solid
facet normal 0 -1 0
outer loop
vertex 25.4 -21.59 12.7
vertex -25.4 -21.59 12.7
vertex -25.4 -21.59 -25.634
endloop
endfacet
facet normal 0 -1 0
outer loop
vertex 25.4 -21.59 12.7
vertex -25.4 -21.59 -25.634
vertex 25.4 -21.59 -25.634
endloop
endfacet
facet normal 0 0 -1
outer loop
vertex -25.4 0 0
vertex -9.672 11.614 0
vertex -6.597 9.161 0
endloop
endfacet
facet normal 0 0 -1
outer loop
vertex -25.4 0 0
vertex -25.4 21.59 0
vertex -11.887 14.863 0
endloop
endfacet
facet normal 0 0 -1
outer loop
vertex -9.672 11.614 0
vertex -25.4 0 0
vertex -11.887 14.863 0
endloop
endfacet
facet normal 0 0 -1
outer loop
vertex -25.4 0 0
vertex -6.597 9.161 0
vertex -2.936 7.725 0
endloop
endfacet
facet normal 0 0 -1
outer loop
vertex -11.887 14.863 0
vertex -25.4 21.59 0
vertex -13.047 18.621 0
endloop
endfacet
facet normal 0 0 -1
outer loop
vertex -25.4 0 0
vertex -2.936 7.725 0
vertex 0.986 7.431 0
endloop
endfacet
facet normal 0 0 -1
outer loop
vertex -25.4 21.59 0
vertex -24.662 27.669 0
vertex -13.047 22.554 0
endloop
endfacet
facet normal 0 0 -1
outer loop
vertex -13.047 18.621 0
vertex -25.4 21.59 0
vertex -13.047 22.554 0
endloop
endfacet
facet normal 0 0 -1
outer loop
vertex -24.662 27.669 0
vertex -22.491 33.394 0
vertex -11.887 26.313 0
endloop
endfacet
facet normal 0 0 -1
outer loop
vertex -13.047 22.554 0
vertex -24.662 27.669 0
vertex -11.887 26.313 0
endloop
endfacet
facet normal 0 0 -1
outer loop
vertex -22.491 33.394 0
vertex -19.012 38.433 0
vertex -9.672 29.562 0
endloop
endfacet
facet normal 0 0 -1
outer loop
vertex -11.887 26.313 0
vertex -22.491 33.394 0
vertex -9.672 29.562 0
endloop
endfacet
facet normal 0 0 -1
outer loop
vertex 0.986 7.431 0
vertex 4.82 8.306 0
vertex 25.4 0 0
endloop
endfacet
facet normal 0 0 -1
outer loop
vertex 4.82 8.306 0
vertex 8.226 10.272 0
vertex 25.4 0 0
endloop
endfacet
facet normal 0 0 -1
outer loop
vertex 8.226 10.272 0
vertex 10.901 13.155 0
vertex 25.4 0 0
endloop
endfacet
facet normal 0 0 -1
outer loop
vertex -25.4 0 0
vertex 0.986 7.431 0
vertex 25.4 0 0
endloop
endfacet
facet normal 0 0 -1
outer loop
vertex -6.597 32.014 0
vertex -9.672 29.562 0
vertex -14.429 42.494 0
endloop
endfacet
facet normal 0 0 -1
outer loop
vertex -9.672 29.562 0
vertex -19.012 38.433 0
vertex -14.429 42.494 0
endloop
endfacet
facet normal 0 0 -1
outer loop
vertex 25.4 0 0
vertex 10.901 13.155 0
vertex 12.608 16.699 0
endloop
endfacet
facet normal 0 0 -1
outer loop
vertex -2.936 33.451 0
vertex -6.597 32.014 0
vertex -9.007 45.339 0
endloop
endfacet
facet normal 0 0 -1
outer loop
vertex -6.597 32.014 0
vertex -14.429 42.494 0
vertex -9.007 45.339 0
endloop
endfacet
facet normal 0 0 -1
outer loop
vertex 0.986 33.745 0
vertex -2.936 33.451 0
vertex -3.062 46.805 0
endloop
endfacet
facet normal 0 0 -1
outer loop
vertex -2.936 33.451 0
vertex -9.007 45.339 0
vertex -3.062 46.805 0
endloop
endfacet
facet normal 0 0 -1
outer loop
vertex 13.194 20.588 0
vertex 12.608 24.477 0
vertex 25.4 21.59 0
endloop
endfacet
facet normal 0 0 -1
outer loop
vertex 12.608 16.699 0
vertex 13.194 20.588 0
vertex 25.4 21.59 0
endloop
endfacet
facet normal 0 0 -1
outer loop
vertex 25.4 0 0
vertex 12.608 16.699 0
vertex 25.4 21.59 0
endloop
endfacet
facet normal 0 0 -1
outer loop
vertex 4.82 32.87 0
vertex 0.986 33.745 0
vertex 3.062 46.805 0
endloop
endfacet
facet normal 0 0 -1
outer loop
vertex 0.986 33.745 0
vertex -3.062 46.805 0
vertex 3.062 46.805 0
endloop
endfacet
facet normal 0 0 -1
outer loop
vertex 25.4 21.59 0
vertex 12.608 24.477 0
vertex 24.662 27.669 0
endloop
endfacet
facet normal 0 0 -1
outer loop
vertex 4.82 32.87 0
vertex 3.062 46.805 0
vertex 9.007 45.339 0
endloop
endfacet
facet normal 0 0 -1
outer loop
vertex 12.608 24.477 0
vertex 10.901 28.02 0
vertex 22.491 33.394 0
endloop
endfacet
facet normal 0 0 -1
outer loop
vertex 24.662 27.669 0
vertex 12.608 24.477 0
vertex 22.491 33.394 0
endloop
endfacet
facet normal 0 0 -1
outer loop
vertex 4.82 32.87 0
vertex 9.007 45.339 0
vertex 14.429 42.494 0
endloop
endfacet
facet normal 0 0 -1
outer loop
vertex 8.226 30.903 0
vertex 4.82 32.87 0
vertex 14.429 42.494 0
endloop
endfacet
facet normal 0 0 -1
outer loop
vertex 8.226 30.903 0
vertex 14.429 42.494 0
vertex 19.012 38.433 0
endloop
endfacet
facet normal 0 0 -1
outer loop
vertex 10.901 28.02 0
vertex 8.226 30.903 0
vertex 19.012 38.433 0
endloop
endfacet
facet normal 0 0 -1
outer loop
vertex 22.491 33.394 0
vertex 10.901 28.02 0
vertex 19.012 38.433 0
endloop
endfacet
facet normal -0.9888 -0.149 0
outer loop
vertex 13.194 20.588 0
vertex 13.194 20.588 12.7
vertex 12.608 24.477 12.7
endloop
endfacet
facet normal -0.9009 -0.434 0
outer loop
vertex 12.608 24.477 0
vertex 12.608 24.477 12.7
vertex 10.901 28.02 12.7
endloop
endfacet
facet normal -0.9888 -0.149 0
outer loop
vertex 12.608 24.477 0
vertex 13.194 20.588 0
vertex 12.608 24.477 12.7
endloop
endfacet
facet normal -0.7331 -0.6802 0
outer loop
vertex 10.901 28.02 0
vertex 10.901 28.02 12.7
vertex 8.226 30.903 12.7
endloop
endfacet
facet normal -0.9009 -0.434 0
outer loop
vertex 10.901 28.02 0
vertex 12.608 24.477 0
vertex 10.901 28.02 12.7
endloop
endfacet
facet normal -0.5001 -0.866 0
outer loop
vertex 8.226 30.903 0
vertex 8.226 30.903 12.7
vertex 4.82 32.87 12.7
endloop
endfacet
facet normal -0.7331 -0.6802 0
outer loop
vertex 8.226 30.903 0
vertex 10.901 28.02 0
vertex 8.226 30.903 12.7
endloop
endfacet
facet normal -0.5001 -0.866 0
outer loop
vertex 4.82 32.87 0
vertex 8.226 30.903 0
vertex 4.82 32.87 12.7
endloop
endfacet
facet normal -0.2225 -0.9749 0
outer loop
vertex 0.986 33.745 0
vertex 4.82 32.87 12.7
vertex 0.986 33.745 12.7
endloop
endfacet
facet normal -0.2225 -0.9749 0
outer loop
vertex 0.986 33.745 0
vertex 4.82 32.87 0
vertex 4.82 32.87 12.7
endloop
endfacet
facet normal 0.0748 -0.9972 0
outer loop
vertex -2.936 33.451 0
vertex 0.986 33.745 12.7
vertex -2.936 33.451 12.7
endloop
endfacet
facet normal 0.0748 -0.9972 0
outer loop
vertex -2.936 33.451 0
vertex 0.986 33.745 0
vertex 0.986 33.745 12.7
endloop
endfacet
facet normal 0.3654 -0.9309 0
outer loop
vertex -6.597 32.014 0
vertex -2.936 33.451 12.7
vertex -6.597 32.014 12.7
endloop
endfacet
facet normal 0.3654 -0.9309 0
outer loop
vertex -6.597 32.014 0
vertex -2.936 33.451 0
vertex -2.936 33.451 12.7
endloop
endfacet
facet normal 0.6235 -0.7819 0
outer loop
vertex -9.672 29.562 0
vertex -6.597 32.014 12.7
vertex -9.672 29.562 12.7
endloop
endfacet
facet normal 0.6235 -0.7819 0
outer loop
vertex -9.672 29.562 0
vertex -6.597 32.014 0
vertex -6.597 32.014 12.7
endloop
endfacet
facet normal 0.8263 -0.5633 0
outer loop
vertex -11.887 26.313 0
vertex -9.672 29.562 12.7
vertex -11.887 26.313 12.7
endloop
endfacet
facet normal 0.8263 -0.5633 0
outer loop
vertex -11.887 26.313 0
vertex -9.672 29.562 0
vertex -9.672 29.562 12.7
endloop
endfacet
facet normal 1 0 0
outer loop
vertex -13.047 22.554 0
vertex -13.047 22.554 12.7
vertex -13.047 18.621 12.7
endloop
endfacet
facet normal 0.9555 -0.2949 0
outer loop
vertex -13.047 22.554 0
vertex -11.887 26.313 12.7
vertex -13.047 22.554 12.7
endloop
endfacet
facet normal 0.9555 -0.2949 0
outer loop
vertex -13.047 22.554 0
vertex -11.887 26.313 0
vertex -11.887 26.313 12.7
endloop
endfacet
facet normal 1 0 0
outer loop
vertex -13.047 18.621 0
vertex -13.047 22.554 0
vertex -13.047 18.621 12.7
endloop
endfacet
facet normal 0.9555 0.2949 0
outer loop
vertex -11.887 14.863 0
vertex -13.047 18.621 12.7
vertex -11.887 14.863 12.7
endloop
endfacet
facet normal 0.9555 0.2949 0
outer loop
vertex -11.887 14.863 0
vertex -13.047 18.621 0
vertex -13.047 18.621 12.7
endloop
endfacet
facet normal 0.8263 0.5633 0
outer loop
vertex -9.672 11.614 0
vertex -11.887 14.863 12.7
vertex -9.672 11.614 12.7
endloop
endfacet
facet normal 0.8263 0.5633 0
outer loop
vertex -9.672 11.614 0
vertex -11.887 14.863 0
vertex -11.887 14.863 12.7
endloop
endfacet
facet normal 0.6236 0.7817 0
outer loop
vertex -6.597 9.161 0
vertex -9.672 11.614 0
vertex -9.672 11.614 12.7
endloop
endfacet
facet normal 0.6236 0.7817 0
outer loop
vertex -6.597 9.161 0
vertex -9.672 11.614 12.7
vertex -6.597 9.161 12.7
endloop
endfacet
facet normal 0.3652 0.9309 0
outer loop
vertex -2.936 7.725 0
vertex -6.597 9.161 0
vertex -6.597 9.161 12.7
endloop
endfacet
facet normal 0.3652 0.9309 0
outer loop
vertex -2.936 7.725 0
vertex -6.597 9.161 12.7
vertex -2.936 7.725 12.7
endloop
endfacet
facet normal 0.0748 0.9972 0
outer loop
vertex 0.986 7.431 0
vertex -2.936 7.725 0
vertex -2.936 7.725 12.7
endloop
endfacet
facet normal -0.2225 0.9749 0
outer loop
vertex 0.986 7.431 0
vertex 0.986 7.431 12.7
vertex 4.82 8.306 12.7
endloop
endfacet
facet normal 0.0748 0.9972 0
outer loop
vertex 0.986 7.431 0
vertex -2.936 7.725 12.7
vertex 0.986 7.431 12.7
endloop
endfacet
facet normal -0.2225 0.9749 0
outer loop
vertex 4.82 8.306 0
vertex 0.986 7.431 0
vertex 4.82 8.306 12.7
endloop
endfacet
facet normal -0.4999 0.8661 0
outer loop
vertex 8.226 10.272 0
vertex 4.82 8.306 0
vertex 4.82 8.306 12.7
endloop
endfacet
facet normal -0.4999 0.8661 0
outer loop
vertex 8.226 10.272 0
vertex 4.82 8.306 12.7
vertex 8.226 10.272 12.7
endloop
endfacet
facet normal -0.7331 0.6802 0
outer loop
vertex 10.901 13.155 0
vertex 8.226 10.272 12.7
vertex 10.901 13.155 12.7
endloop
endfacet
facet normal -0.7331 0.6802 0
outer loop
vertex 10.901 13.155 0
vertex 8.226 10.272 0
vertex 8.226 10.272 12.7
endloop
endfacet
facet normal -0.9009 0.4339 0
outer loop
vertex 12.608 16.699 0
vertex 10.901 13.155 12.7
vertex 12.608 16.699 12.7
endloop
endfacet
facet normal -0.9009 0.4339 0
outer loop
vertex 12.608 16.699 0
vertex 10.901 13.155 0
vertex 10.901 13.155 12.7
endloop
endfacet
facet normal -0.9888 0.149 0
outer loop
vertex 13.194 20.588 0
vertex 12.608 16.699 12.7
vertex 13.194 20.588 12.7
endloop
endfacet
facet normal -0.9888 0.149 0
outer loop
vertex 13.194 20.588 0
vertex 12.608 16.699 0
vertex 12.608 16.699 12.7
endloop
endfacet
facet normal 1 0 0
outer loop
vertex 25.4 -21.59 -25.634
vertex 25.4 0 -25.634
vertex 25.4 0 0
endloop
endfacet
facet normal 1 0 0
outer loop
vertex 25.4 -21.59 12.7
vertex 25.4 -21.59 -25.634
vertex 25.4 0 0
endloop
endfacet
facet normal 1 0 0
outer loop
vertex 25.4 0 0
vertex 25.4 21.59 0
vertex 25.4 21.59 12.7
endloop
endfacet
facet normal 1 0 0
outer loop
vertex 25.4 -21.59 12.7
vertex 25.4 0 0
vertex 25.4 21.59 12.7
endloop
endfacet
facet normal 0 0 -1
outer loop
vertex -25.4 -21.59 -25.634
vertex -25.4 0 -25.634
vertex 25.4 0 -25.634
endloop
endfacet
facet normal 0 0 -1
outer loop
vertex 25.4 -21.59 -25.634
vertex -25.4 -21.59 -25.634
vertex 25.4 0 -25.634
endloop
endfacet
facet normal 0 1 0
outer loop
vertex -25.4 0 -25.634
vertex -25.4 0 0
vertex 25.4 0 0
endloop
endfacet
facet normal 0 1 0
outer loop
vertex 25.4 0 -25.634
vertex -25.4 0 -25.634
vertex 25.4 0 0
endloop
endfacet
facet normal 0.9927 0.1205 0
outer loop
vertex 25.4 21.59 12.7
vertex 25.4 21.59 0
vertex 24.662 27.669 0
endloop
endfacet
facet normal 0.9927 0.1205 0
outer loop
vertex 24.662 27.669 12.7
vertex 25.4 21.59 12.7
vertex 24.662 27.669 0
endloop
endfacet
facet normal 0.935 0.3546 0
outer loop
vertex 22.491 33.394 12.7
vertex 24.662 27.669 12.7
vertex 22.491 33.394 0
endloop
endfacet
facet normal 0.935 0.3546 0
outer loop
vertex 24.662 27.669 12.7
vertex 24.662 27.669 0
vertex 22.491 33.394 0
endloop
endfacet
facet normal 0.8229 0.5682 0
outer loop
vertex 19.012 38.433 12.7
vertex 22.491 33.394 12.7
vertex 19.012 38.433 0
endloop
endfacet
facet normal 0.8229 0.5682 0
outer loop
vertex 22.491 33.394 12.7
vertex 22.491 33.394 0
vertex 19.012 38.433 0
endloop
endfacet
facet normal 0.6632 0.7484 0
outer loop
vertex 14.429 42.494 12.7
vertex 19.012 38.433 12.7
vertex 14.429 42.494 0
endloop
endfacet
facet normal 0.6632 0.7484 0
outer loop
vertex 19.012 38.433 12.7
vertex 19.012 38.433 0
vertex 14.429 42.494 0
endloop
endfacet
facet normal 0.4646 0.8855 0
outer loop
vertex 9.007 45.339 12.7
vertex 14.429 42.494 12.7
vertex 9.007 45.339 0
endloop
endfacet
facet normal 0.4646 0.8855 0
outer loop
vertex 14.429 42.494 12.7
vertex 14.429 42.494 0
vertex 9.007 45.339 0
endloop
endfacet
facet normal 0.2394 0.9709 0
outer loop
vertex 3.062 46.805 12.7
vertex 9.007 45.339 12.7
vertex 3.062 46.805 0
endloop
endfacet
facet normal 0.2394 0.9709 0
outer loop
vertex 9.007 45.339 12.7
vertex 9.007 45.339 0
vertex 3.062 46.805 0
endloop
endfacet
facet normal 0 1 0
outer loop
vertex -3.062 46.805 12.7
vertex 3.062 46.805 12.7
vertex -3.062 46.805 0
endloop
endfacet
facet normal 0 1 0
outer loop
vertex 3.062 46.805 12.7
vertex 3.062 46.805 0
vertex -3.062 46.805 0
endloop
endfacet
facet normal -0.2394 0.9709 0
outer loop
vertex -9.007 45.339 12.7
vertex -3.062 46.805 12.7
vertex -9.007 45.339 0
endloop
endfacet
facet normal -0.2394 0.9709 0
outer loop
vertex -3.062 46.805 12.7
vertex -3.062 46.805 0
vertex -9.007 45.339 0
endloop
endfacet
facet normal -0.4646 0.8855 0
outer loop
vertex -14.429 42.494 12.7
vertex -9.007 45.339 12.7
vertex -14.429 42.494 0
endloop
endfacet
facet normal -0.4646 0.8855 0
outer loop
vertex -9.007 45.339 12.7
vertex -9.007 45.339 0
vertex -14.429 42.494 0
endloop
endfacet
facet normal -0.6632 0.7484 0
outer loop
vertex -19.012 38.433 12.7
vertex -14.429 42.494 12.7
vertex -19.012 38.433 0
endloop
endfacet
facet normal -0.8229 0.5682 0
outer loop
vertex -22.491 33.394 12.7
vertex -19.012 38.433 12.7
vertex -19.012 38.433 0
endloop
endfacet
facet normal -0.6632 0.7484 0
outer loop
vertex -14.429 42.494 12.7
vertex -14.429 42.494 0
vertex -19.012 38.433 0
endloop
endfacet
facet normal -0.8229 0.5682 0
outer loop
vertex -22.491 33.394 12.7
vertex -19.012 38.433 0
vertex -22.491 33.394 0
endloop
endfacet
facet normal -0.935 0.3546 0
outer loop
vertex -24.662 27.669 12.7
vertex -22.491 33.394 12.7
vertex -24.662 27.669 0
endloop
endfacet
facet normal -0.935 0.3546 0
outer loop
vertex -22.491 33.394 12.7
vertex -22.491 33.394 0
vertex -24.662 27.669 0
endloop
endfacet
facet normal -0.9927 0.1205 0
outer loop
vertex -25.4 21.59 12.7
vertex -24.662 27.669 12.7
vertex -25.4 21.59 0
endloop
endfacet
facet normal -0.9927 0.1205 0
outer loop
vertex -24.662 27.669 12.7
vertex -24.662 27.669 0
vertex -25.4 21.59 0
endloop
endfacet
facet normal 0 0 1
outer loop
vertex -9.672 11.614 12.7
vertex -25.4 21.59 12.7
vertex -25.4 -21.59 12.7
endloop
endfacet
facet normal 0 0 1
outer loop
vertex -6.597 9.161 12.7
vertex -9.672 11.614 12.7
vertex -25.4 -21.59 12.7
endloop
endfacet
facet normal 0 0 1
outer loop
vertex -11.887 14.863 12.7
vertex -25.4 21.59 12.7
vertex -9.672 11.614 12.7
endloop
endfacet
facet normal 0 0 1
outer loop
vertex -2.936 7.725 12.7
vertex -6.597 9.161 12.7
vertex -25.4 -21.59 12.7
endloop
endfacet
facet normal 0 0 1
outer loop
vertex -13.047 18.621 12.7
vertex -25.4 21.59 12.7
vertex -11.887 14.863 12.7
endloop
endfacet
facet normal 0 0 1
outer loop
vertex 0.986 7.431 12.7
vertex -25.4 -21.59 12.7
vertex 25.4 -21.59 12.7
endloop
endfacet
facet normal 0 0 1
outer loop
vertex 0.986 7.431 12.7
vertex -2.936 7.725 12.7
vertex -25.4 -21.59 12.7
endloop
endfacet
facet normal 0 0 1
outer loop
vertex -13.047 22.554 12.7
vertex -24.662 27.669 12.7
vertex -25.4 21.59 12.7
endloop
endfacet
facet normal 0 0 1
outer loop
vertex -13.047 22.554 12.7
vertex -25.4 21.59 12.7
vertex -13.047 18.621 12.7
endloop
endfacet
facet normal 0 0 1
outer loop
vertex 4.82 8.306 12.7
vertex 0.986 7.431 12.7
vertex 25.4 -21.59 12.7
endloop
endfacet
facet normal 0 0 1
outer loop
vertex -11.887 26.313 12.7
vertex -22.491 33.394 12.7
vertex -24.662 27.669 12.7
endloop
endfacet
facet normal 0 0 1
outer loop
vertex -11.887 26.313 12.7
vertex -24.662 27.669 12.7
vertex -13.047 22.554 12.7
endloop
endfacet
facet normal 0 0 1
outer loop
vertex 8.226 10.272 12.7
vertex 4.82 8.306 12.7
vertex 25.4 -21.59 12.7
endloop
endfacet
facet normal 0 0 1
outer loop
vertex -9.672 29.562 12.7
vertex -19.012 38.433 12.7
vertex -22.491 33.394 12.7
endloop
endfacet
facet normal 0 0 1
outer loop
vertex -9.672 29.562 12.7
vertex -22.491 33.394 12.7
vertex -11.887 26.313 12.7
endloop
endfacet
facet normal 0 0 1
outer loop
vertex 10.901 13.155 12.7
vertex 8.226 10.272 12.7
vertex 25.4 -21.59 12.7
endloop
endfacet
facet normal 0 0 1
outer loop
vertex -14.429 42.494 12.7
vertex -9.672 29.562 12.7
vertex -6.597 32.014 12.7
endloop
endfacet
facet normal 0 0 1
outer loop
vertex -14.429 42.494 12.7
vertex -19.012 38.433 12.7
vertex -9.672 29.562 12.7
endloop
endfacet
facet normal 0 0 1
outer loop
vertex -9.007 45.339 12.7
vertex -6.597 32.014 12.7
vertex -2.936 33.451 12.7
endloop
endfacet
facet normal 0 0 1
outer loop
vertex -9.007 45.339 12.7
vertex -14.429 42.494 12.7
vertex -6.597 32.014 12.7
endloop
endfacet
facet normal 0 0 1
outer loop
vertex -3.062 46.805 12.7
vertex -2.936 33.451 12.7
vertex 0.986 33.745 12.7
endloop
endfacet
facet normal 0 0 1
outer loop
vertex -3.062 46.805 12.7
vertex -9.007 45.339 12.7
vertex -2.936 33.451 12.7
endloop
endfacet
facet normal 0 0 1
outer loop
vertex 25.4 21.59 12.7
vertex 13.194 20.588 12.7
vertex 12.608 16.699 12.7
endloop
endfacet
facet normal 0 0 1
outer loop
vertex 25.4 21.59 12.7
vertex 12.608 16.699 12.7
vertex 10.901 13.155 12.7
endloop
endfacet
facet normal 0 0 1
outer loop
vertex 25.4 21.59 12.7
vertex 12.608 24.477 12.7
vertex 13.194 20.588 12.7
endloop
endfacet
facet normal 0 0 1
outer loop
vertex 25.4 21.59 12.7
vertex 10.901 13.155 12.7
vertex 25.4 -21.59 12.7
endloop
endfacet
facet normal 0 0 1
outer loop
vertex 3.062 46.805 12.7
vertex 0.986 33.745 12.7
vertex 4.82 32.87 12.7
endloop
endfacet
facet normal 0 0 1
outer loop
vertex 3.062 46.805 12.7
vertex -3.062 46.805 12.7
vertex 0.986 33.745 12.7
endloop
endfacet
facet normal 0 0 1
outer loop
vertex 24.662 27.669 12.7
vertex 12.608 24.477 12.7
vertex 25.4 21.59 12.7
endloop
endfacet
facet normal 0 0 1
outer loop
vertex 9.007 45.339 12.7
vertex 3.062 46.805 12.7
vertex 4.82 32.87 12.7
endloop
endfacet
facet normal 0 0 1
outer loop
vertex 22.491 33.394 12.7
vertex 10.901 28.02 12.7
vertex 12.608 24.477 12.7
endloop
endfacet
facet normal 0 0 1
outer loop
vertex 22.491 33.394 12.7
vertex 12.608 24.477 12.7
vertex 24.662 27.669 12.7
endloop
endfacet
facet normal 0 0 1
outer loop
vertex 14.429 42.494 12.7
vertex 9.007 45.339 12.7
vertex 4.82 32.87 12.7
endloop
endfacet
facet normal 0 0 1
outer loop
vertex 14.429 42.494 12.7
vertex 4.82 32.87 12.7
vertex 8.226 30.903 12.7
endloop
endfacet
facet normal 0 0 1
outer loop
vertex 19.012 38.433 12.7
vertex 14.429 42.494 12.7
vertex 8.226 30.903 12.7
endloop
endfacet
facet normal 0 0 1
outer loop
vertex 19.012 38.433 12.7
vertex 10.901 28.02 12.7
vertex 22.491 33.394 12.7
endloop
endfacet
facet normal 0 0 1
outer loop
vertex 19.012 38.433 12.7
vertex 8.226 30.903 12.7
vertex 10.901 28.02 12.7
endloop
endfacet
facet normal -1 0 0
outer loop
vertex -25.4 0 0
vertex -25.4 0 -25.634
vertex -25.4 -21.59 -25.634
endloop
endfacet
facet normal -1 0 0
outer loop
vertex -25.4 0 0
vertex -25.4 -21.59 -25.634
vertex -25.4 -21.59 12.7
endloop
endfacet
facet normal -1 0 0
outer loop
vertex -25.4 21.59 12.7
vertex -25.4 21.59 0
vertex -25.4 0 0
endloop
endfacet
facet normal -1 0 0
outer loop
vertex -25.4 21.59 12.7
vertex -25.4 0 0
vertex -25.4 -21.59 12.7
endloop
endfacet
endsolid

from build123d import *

# Parameters (mm, degrees)
F0_W     = 50.8
F0_H     = 43.18
F1_DEPTH = 12.7
F2_R     = 13.194119
F3_DEPTH = 12.701
F4_W     = 50.8
F4_H     = 25.634238
F5_DEPTH = 21.59


with BuildPart() as f1:
    # F0 (on Top) → F1 (new body)
    with BuildSketch(Plane.XY):
        with BuildLine():
            ThreePointArc((25.4, 21.59), (0, 46.99), (-25.4, 21.59))
            Line((-25.4, 21.59), (25.4, 21.59))
        make_face()
        Rectangle(F0_W, F0_H)
    extrude(amount=F1_DEPTH)

    # F2 (on Top) → F3 (cut, through all)
    with BuildSketch(Plane.XY):
        with Locations((0, 20.587881)):
            Circle(F2_R)
    extrude(amount=F3_DEPTH, mode=Mode.SUBTRACT)

    # F4 (on Front) → F5 (join)
    with BuildSketch(Plane.XZ):
        with Locations((0, -12.817119)):
            Rectangle(F4_W, F4_H)
    extrude(amount=F5_DEPTH)


solid = f1.part
